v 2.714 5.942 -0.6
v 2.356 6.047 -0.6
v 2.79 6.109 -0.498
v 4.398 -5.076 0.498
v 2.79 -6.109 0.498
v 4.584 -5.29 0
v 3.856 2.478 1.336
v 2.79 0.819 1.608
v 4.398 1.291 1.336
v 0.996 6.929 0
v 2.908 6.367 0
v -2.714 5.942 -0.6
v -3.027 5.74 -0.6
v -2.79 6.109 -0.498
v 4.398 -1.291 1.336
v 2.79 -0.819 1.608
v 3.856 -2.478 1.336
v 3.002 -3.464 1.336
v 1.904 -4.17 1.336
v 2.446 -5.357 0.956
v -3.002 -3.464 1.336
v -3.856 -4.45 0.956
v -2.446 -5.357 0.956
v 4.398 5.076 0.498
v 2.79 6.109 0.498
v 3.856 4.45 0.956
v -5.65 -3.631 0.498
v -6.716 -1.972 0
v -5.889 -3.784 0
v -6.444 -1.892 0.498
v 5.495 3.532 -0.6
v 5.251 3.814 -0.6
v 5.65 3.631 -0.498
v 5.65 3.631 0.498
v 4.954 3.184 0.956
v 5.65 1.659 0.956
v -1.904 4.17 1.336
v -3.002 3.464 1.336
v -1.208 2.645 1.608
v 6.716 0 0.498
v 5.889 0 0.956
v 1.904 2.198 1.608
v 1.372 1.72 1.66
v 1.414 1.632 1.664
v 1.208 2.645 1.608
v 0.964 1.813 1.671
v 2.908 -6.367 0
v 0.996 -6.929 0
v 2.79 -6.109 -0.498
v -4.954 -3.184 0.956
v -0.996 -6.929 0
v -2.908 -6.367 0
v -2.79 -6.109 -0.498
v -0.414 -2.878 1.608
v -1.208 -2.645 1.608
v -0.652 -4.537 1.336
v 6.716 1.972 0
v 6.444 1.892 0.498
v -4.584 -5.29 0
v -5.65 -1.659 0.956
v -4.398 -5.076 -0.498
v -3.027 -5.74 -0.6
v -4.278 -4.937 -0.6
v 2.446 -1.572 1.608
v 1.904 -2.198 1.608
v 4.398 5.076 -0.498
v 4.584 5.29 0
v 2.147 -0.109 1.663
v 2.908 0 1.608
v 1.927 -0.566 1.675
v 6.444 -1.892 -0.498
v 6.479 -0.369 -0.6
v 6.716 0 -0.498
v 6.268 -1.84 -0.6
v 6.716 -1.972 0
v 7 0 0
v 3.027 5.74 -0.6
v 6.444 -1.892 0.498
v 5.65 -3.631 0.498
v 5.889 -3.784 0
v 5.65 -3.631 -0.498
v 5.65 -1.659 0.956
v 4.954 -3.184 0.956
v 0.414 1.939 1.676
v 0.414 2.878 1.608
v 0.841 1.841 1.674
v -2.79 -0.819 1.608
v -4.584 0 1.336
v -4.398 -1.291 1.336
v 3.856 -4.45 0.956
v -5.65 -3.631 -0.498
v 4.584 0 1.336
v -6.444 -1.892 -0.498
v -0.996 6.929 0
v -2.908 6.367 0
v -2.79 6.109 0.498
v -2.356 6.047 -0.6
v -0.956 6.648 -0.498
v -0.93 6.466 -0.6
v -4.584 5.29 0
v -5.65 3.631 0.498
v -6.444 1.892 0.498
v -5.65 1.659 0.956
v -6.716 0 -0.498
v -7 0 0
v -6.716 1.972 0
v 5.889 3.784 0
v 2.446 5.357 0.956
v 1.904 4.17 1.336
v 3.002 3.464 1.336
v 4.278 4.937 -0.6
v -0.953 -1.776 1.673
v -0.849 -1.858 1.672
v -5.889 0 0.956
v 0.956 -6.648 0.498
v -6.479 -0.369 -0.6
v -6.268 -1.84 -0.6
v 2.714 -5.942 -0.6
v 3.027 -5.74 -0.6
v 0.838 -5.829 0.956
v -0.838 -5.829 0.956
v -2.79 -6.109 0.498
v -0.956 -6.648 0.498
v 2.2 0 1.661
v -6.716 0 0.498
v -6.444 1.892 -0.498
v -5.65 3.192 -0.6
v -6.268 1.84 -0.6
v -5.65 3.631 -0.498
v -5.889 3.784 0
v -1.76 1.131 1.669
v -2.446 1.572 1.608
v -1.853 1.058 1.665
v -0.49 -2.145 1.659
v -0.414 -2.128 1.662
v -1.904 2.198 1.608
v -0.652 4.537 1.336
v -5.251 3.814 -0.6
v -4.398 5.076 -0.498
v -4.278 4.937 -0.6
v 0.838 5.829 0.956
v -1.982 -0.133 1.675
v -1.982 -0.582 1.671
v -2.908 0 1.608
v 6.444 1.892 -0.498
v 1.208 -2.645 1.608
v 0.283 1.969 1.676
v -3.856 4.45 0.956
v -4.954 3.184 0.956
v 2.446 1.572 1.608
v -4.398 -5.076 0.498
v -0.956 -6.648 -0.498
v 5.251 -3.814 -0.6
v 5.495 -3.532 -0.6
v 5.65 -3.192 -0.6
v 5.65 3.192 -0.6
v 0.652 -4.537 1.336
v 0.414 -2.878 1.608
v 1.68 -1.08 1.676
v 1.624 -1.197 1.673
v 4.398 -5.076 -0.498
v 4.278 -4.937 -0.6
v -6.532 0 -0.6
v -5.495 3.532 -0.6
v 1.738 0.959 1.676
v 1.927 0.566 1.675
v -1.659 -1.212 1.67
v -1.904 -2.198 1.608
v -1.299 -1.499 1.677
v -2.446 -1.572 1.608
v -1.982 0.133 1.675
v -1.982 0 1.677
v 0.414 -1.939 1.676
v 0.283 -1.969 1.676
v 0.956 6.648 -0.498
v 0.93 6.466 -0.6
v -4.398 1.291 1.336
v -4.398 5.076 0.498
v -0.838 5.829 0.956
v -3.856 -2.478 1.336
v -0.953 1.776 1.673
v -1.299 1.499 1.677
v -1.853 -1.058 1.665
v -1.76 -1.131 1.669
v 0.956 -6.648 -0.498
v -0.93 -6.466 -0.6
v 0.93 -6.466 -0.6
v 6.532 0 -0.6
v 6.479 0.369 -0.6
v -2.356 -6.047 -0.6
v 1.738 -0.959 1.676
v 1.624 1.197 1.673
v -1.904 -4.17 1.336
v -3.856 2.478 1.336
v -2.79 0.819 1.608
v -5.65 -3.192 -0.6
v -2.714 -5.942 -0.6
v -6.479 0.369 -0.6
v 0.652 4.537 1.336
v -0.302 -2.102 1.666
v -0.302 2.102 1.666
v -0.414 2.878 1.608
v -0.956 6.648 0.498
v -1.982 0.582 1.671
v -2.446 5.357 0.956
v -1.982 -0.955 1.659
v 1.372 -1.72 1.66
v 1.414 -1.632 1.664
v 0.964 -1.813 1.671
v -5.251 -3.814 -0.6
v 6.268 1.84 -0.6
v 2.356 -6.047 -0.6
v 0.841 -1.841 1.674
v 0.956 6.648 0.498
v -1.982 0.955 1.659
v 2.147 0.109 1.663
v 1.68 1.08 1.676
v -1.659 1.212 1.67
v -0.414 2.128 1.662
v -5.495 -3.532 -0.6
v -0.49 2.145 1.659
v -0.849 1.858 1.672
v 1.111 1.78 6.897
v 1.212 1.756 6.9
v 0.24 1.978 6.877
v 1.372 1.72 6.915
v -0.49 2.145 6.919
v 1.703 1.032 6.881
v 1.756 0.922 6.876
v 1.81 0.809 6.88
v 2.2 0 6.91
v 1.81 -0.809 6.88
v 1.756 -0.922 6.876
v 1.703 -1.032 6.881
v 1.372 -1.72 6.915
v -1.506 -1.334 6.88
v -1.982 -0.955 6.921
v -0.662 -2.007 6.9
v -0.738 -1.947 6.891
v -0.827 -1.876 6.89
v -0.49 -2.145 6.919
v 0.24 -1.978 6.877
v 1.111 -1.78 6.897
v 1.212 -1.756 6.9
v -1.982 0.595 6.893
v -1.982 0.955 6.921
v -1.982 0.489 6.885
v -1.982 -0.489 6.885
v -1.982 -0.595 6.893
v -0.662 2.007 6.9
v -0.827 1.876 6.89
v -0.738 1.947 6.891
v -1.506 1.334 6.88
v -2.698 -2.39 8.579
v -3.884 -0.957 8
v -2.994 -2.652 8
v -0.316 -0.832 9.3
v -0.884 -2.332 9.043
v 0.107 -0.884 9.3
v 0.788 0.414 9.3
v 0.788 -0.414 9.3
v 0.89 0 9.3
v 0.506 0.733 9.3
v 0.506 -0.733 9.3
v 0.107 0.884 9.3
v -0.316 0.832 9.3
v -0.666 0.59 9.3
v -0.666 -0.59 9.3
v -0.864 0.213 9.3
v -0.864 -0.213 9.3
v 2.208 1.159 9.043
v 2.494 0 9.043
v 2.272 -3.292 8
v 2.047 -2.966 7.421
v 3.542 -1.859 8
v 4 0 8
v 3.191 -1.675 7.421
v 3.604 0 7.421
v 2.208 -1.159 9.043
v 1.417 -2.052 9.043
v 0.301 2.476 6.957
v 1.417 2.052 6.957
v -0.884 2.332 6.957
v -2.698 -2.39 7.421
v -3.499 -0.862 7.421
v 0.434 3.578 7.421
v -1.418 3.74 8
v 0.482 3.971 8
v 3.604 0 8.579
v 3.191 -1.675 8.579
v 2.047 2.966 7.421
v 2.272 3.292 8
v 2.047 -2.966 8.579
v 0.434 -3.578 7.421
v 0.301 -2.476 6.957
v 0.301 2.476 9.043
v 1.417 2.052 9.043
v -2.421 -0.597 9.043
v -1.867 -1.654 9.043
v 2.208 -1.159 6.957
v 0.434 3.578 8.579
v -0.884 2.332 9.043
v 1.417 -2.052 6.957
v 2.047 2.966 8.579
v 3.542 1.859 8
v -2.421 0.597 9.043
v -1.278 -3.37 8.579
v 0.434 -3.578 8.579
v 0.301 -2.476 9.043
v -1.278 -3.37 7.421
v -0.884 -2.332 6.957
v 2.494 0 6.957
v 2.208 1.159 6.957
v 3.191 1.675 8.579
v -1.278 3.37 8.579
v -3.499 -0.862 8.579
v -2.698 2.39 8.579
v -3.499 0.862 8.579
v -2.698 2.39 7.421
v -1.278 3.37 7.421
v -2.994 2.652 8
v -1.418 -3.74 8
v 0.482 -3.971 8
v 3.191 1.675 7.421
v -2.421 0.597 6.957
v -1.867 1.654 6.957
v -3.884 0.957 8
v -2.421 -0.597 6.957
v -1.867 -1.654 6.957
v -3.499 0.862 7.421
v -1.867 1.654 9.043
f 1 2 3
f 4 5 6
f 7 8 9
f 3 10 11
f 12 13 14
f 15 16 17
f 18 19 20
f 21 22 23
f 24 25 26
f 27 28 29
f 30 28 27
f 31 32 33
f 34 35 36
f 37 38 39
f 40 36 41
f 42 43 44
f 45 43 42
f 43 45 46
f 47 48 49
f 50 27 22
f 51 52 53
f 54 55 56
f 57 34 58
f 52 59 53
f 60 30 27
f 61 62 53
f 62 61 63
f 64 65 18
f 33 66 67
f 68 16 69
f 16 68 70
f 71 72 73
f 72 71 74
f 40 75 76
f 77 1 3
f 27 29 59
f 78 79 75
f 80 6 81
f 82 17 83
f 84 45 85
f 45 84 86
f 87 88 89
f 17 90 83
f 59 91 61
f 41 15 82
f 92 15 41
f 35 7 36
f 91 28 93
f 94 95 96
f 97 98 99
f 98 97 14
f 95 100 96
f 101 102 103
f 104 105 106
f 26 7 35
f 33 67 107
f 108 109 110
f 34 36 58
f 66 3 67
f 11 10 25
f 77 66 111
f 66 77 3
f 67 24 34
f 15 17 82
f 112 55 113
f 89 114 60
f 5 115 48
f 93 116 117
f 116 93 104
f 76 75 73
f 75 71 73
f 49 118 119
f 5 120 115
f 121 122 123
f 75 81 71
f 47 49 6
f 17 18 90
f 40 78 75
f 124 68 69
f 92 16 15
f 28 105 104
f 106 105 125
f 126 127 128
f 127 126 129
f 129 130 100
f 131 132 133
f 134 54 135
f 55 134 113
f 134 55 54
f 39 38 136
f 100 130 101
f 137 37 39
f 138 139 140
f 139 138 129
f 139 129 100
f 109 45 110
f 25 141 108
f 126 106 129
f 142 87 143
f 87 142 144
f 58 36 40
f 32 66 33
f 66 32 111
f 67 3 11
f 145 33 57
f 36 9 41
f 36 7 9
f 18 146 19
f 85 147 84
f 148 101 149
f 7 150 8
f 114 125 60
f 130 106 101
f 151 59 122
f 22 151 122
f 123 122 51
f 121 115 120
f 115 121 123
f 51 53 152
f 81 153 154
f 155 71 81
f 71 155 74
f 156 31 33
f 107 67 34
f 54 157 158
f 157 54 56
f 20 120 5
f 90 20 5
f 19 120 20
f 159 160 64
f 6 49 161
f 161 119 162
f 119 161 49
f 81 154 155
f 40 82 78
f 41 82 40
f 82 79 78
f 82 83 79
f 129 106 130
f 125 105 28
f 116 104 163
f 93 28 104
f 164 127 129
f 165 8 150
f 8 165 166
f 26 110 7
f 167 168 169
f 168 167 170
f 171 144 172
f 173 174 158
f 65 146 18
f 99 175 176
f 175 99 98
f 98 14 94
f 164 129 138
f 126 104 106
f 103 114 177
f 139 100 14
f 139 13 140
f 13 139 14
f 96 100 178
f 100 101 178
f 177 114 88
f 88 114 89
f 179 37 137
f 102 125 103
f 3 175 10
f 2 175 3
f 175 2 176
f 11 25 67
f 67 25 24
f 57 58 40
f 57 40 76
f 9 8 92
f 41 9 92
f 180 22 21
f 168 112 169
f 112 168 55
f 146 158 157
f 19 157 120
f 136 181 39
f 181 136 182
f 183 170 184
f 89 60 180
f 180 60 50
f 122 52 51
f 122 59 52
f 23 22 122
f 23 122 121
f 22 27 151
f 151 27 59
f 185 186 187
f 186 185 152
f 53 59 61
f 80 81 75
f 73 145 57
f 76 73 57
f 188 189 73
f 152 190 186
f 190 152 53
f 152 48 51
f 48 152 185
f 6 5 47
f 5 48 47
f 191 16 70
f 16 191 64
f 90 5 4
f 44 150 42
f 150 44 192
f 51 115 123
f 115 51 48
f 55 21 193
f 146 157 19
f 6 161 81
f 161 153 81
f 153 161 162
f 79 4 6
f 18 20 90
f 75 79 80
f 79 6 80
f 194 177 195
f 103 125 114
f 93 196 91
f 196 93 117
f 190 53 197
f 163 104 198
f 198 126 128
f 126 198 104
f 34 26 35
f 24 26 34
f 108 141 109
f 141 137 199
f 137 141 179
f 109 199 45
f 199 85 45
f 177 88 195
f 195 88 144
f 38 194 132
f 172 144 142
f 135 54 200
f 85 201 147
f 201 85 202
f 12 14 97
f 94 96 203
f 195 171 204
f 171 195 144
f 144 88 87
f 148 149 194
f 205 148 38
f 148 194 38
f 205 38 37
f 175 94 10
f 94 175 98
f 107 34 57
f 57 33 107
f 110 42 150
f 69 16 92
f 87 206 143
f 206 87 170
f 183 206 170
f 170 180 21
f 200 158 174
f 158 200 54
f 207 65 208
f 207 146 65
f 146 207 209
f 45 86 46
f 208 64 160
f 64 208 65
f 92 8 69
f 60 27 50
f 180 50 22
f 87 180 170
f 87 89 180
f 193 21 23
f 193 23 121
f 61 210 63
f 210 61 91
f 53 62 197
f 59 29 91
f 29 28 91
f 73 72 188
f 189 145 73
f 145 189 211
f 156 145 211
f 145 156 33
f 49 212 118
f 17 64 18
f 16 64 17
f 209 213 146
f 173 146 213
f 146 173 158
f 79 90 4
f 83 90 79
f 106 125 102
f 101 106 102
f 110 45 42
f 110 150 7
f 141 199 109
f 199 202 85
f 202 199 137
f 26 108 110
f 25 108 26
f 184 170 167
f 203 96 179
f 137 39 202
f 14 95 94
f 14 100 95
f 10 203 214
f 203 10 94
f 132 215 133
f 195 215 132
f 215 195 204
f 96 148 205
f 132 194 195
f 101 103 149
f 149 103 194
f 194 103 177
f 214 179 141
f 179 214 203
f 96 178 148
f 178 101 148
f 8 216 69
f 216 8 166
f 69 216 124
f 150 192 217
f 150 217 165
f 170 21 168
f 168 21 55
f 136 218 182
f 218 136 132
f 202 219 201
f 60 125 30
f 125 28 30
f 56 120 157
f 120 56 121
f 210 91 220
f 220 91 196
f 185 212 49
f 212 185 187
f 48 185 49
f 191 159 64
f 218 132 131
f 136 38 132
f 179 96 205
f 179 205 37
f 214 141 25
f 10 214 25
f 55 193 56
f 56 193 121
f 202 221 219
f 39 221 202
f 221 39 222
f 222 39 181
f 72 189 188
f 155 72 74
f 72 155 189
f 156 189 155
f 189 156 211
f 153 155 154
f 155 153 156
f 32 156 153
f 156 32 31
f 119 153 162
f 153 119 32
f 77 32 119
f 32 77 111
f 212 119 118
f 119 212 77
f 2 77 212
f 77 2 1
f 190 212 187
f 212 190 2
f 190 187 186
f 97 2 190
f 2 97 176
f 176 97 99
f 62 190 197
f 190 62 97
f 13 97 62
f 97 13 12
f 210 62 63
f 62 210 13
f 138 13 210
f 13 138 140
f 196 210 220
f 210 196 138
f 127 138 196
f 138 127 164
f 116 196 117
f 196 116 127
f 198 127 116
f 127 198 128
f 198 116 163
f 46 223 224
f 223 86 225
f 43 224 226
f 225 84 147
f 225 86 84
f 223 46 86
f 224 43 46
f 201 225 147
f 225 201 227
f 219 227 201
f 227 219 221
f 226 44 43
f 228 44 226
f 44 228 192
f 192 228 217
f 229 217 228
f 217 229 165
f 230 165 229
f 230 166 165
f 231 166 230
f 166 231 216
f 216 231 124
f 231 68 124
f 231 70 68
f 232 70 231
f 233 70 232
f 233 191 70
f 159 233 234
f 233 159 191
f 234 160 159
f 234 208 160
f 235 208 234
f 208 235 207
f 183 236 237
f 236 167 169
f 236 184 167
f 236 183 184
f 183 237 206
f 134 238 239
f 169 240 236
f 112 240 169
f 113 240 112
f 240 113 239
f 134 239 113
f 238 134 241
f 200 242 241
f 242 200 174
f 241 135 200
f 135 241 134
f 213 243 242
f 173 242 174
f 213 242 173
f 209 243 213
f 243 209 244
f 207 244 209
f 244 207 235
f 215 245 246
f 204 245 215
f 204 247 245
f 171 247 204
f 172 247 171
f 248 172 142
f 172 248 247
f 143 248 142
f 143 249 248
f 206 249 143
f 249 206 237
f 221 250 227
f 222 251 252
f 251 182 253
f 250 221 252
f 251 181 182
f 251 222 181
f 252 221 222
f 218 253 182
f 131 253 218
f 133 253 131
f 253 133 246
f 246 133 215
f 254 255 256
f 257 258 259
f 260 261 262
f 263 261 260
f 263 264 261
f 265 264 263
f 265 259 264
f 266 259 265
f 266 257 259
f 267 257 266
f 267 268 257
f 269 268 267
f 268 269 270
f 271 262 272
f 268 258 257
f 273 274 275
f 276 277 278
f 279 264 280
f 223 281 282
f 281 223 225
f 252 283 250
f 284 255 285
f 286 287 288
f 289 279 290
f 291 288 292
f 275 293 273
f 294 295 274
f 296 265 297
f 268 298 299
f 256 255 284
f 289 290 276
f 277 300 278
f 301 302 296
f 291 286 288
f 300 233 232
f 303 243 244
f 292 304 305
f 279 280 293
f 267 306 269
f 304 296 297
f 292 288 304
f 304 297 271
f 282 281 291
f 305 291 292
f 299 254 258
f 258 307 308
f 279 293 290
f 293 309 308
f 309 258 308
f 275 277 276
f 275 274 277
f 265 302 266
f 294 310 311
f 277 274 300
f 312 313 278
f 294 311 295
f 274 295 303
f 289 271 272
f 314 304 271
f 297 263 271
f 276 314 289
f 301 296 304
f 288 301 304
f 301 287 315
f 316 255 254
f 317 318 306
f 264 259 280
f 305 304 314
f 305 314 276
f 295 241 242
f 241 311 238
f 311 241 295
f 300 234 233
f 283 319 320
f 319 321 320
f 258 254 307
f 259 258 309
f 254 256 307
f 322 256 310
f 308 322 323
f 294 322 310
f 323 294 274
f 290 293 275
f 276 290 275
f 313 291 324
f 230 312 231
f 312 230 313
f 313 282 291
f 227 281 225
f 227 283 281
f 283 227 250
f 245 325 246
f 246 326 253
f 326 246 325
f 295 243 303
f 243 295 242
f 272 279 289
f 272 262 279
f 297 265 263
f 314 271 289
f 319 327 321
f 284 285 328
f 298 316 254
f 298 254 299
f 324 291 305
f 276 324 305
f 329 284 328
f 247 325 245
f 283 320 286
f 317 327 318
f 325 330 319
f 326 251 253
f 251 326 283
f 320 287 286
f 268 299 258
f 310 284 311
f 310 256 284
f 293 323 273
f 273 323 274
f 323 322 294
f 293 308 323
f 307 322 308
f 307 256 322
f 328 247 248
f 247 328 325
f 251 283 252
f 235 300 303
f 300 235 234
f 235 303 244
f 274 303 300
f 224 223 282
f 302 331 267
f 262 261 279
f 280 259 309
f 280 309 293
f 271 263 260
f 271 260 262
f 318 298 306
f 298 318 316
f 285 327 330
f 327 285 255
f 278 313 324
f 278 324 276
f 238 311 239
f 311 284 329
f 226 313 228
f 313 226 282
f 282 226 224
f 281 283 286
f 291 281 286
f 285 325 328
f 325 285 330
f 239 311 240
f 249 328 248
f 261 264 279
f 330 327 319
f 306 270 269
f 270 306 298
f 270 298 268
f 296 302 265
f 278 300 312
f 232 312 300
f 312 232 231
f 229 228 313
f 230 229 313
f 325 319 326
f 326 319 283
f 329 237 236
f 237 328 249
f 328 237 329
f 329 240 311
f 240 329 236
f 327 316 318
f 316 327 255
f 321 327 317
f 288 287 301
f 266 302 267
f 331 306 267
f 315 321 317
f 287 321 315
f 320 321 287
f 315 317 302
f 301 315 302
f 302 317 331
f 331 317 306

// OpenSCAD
$fns = 30;
headRadius=5;
headHeight=5;
shaftRadius=10;
shaftLength=10;
endRadius=3;

cufflink();


module cufflink()
{
    cylinder(r=2.2, h=7.8, center=false);
   
    translate ([0,0,8])  resize([0,0,2.6]) sphere(r=4, center=true);
    
    difference()
    {
    resize([0,0,3.5]) sphere(r=7, center=true);
    translate([0,0,-5.6]) cube([20,20,10], center=true);
    }
}
